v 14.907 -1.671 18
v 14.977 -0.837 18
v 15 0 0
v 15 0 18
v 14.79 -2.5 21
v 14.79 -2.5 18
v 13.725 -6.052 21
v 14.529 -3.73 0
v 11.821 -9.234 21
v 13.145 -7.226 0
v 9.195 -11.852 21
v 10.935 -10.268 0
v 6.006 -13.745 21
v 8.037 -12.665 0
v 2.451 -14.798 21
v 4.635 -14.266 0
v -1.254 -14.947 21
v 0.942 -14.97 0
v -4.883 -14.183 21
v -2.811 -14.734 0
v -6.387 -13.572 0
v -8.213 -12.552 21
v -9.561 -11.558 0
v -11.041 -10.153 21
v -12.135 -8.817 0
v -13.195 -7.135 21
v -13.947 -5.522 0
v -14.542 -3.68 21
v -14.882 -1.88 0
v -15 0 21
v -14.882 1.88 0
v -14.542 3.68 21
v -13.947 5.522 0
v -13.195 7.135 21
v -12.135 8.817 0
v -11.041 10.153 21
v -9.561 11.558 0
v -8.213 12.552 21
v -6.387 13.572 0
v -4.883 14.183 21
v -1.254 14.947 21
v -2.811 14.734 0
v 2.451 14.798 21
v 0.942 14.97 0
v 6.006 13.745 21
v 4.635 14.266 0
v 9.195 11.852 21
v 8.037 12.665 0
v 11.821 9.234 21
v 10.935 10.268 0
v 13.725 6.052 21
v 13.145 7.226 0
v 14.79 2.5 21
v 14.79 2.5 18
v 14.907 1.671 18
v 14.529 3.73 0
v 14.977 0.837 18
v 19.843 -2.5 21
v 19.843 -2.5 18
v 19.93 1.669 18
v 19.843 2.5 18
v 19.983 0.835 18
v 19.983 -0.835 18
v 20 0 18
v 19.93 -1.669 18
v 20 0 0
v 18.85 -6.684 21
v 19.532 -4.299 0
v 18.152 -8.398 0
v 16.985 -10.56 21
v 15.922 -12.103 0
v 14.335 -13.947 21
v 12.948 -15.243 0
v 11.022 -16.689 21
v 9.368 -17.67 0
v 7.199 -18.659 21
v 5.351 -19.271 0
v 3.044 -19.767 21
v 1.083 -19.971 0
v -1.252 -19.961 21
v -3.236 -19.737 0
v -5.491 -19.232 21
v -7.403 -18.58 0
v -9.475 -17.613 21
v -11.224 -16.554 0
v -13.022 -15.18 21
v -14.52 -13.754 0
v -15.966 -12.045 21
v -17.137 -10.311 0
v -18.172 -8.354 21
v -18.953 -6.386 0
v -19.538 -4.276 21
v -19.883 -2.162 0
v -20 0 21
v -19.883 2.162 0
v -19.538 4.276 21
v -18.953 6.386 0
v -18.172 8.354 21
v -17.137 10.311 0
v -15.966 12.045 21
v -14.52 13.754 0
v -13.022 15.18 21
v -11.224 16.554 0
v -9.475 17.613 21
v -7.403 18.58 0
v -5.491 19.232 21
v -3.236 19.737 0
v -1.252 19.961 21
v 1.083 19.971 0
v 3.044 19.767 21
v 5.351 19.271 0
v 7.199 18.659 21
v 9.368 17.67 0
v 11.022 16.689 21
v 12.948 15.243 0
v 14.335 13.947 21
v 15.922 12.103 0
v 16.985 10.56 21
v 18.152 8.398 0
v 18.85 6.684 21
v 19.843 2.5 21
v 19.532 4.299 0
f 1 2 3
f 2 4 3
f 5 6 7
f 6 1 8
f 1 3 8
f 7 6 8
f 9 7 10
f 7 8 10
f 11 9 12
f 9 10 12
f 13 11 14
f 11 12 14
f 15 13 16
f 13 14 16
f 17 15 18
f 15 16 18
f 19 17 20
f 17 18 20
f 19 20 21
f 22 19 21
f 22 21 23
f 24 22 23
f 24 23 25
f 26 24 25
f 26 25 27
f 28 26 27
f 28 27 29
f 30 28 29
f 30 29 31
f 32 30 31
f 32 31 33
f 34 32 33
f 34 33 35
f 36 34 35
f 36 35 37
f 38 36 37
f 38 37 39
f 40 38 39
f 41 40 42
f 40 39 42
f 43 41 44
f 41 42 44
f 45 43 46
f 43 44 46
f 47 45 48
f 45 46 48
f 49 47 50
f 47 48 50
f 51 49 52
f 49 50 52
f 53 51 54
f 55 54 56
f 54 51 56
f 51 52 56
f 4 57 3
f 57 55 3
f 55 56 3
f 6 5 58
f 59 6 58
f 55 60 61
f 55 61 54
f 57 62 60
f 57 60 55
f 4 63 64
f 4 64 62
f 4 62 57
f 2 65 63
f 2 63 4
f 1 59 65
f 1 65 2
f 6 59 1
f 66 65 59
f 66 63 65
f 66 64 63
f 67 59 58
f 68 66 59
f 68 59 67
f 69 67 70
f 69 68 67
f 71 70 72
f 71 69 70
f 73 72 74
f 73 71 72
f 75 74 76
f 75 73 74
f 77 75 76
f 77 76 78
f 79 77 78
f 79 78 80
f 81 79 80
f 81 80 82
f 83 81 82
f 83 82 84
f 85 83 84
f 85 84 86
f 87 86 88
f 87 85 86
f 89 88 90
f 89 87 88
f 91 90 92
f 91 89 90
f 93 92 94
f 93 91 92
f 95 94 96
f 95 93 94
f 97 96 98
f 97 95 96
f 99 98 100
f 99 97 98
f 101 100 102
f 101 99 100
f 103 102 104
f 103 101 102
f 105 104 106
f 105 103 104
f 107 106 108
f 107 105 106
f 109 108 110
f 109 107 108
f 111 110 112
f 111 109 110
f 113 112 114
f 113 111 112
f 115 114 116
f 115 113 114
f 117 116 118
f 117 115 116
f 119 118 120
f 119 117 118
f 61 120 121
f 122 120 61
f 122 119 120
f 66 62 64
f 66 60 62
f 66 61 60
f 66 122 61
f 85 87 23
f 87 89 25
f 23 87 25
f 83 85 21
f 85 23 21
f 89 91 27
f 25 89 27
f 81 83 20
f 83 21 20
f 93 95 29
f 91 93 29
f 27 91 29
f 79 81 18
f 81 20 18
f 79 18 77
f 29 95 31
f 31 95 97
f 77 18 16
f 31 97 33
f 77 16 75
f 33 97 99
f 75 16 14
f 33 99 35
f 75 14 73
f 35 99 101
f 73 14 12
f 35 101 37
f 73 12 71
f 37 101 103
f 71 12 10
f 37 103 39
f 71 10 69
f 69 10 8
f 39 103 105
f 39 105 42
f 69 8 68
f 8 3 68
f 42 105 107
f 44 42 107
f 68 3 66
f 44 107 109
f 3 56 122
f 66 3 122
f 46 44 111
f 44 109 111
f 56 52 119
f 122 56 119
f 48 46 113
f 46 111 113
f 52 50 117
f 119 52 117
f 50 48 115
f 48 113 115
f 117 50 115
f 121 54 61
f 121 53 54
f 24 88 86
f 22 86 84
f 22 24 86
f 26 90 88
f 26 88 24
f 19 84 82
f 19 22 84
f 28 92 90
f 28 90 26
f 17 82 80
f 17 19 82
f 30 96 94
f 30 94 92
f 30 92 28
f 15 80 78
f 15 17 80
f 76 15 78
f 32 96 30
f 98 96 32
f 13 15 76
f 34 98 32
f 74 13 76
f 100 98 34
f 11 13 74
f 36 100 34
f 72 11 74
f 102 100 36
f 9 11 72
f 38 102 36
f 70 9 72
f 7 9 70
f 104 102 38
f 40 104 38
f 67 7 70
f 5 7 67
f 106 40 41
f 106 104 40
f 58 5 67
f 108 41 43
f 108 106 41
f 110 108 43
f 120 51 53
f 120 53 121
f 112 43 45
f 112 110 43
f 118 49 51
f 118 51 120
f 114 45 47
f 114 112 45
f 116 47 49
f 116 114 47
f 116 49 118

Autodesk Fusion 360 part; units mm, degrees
sketch "Sketch1" plane through (0, 0, 0) normal (0, 0, 1) x (1, 0, 0)
  circle A0 centre (0, 0) radius 15
  circle A1 centre (0, 0) radius 20
  dimension "d1" = 30
  dimension "d2" = 5
extrude "Extrude1" add sketch "Sketch1" along normal blind 21
sketch "Sketch2" plane through (0, 0, 21) normal (0, 0, 1) x (-1, 0, 0)
  circle A0 centre (0, 0) radius 15
  circle A1 centre (0, 0) radius 20
  line L0 (-14.7902, -2.5) -> (-19.8431, -2.5)
  line L1 (-14.7902, 2.5) -> (-19.8431, 2.5)
  line L2 (-14.7902, -2.5) -> (-14.7902, 2.5) construction
  point P0 (-14.7902, 0)
  dimension "d5" = 5
extrude "Extrude2" cut sketch "Sketch2" against normal blind 3 contours A0 A1 L0 L1 picked at (-16.5367, -1.9456)
